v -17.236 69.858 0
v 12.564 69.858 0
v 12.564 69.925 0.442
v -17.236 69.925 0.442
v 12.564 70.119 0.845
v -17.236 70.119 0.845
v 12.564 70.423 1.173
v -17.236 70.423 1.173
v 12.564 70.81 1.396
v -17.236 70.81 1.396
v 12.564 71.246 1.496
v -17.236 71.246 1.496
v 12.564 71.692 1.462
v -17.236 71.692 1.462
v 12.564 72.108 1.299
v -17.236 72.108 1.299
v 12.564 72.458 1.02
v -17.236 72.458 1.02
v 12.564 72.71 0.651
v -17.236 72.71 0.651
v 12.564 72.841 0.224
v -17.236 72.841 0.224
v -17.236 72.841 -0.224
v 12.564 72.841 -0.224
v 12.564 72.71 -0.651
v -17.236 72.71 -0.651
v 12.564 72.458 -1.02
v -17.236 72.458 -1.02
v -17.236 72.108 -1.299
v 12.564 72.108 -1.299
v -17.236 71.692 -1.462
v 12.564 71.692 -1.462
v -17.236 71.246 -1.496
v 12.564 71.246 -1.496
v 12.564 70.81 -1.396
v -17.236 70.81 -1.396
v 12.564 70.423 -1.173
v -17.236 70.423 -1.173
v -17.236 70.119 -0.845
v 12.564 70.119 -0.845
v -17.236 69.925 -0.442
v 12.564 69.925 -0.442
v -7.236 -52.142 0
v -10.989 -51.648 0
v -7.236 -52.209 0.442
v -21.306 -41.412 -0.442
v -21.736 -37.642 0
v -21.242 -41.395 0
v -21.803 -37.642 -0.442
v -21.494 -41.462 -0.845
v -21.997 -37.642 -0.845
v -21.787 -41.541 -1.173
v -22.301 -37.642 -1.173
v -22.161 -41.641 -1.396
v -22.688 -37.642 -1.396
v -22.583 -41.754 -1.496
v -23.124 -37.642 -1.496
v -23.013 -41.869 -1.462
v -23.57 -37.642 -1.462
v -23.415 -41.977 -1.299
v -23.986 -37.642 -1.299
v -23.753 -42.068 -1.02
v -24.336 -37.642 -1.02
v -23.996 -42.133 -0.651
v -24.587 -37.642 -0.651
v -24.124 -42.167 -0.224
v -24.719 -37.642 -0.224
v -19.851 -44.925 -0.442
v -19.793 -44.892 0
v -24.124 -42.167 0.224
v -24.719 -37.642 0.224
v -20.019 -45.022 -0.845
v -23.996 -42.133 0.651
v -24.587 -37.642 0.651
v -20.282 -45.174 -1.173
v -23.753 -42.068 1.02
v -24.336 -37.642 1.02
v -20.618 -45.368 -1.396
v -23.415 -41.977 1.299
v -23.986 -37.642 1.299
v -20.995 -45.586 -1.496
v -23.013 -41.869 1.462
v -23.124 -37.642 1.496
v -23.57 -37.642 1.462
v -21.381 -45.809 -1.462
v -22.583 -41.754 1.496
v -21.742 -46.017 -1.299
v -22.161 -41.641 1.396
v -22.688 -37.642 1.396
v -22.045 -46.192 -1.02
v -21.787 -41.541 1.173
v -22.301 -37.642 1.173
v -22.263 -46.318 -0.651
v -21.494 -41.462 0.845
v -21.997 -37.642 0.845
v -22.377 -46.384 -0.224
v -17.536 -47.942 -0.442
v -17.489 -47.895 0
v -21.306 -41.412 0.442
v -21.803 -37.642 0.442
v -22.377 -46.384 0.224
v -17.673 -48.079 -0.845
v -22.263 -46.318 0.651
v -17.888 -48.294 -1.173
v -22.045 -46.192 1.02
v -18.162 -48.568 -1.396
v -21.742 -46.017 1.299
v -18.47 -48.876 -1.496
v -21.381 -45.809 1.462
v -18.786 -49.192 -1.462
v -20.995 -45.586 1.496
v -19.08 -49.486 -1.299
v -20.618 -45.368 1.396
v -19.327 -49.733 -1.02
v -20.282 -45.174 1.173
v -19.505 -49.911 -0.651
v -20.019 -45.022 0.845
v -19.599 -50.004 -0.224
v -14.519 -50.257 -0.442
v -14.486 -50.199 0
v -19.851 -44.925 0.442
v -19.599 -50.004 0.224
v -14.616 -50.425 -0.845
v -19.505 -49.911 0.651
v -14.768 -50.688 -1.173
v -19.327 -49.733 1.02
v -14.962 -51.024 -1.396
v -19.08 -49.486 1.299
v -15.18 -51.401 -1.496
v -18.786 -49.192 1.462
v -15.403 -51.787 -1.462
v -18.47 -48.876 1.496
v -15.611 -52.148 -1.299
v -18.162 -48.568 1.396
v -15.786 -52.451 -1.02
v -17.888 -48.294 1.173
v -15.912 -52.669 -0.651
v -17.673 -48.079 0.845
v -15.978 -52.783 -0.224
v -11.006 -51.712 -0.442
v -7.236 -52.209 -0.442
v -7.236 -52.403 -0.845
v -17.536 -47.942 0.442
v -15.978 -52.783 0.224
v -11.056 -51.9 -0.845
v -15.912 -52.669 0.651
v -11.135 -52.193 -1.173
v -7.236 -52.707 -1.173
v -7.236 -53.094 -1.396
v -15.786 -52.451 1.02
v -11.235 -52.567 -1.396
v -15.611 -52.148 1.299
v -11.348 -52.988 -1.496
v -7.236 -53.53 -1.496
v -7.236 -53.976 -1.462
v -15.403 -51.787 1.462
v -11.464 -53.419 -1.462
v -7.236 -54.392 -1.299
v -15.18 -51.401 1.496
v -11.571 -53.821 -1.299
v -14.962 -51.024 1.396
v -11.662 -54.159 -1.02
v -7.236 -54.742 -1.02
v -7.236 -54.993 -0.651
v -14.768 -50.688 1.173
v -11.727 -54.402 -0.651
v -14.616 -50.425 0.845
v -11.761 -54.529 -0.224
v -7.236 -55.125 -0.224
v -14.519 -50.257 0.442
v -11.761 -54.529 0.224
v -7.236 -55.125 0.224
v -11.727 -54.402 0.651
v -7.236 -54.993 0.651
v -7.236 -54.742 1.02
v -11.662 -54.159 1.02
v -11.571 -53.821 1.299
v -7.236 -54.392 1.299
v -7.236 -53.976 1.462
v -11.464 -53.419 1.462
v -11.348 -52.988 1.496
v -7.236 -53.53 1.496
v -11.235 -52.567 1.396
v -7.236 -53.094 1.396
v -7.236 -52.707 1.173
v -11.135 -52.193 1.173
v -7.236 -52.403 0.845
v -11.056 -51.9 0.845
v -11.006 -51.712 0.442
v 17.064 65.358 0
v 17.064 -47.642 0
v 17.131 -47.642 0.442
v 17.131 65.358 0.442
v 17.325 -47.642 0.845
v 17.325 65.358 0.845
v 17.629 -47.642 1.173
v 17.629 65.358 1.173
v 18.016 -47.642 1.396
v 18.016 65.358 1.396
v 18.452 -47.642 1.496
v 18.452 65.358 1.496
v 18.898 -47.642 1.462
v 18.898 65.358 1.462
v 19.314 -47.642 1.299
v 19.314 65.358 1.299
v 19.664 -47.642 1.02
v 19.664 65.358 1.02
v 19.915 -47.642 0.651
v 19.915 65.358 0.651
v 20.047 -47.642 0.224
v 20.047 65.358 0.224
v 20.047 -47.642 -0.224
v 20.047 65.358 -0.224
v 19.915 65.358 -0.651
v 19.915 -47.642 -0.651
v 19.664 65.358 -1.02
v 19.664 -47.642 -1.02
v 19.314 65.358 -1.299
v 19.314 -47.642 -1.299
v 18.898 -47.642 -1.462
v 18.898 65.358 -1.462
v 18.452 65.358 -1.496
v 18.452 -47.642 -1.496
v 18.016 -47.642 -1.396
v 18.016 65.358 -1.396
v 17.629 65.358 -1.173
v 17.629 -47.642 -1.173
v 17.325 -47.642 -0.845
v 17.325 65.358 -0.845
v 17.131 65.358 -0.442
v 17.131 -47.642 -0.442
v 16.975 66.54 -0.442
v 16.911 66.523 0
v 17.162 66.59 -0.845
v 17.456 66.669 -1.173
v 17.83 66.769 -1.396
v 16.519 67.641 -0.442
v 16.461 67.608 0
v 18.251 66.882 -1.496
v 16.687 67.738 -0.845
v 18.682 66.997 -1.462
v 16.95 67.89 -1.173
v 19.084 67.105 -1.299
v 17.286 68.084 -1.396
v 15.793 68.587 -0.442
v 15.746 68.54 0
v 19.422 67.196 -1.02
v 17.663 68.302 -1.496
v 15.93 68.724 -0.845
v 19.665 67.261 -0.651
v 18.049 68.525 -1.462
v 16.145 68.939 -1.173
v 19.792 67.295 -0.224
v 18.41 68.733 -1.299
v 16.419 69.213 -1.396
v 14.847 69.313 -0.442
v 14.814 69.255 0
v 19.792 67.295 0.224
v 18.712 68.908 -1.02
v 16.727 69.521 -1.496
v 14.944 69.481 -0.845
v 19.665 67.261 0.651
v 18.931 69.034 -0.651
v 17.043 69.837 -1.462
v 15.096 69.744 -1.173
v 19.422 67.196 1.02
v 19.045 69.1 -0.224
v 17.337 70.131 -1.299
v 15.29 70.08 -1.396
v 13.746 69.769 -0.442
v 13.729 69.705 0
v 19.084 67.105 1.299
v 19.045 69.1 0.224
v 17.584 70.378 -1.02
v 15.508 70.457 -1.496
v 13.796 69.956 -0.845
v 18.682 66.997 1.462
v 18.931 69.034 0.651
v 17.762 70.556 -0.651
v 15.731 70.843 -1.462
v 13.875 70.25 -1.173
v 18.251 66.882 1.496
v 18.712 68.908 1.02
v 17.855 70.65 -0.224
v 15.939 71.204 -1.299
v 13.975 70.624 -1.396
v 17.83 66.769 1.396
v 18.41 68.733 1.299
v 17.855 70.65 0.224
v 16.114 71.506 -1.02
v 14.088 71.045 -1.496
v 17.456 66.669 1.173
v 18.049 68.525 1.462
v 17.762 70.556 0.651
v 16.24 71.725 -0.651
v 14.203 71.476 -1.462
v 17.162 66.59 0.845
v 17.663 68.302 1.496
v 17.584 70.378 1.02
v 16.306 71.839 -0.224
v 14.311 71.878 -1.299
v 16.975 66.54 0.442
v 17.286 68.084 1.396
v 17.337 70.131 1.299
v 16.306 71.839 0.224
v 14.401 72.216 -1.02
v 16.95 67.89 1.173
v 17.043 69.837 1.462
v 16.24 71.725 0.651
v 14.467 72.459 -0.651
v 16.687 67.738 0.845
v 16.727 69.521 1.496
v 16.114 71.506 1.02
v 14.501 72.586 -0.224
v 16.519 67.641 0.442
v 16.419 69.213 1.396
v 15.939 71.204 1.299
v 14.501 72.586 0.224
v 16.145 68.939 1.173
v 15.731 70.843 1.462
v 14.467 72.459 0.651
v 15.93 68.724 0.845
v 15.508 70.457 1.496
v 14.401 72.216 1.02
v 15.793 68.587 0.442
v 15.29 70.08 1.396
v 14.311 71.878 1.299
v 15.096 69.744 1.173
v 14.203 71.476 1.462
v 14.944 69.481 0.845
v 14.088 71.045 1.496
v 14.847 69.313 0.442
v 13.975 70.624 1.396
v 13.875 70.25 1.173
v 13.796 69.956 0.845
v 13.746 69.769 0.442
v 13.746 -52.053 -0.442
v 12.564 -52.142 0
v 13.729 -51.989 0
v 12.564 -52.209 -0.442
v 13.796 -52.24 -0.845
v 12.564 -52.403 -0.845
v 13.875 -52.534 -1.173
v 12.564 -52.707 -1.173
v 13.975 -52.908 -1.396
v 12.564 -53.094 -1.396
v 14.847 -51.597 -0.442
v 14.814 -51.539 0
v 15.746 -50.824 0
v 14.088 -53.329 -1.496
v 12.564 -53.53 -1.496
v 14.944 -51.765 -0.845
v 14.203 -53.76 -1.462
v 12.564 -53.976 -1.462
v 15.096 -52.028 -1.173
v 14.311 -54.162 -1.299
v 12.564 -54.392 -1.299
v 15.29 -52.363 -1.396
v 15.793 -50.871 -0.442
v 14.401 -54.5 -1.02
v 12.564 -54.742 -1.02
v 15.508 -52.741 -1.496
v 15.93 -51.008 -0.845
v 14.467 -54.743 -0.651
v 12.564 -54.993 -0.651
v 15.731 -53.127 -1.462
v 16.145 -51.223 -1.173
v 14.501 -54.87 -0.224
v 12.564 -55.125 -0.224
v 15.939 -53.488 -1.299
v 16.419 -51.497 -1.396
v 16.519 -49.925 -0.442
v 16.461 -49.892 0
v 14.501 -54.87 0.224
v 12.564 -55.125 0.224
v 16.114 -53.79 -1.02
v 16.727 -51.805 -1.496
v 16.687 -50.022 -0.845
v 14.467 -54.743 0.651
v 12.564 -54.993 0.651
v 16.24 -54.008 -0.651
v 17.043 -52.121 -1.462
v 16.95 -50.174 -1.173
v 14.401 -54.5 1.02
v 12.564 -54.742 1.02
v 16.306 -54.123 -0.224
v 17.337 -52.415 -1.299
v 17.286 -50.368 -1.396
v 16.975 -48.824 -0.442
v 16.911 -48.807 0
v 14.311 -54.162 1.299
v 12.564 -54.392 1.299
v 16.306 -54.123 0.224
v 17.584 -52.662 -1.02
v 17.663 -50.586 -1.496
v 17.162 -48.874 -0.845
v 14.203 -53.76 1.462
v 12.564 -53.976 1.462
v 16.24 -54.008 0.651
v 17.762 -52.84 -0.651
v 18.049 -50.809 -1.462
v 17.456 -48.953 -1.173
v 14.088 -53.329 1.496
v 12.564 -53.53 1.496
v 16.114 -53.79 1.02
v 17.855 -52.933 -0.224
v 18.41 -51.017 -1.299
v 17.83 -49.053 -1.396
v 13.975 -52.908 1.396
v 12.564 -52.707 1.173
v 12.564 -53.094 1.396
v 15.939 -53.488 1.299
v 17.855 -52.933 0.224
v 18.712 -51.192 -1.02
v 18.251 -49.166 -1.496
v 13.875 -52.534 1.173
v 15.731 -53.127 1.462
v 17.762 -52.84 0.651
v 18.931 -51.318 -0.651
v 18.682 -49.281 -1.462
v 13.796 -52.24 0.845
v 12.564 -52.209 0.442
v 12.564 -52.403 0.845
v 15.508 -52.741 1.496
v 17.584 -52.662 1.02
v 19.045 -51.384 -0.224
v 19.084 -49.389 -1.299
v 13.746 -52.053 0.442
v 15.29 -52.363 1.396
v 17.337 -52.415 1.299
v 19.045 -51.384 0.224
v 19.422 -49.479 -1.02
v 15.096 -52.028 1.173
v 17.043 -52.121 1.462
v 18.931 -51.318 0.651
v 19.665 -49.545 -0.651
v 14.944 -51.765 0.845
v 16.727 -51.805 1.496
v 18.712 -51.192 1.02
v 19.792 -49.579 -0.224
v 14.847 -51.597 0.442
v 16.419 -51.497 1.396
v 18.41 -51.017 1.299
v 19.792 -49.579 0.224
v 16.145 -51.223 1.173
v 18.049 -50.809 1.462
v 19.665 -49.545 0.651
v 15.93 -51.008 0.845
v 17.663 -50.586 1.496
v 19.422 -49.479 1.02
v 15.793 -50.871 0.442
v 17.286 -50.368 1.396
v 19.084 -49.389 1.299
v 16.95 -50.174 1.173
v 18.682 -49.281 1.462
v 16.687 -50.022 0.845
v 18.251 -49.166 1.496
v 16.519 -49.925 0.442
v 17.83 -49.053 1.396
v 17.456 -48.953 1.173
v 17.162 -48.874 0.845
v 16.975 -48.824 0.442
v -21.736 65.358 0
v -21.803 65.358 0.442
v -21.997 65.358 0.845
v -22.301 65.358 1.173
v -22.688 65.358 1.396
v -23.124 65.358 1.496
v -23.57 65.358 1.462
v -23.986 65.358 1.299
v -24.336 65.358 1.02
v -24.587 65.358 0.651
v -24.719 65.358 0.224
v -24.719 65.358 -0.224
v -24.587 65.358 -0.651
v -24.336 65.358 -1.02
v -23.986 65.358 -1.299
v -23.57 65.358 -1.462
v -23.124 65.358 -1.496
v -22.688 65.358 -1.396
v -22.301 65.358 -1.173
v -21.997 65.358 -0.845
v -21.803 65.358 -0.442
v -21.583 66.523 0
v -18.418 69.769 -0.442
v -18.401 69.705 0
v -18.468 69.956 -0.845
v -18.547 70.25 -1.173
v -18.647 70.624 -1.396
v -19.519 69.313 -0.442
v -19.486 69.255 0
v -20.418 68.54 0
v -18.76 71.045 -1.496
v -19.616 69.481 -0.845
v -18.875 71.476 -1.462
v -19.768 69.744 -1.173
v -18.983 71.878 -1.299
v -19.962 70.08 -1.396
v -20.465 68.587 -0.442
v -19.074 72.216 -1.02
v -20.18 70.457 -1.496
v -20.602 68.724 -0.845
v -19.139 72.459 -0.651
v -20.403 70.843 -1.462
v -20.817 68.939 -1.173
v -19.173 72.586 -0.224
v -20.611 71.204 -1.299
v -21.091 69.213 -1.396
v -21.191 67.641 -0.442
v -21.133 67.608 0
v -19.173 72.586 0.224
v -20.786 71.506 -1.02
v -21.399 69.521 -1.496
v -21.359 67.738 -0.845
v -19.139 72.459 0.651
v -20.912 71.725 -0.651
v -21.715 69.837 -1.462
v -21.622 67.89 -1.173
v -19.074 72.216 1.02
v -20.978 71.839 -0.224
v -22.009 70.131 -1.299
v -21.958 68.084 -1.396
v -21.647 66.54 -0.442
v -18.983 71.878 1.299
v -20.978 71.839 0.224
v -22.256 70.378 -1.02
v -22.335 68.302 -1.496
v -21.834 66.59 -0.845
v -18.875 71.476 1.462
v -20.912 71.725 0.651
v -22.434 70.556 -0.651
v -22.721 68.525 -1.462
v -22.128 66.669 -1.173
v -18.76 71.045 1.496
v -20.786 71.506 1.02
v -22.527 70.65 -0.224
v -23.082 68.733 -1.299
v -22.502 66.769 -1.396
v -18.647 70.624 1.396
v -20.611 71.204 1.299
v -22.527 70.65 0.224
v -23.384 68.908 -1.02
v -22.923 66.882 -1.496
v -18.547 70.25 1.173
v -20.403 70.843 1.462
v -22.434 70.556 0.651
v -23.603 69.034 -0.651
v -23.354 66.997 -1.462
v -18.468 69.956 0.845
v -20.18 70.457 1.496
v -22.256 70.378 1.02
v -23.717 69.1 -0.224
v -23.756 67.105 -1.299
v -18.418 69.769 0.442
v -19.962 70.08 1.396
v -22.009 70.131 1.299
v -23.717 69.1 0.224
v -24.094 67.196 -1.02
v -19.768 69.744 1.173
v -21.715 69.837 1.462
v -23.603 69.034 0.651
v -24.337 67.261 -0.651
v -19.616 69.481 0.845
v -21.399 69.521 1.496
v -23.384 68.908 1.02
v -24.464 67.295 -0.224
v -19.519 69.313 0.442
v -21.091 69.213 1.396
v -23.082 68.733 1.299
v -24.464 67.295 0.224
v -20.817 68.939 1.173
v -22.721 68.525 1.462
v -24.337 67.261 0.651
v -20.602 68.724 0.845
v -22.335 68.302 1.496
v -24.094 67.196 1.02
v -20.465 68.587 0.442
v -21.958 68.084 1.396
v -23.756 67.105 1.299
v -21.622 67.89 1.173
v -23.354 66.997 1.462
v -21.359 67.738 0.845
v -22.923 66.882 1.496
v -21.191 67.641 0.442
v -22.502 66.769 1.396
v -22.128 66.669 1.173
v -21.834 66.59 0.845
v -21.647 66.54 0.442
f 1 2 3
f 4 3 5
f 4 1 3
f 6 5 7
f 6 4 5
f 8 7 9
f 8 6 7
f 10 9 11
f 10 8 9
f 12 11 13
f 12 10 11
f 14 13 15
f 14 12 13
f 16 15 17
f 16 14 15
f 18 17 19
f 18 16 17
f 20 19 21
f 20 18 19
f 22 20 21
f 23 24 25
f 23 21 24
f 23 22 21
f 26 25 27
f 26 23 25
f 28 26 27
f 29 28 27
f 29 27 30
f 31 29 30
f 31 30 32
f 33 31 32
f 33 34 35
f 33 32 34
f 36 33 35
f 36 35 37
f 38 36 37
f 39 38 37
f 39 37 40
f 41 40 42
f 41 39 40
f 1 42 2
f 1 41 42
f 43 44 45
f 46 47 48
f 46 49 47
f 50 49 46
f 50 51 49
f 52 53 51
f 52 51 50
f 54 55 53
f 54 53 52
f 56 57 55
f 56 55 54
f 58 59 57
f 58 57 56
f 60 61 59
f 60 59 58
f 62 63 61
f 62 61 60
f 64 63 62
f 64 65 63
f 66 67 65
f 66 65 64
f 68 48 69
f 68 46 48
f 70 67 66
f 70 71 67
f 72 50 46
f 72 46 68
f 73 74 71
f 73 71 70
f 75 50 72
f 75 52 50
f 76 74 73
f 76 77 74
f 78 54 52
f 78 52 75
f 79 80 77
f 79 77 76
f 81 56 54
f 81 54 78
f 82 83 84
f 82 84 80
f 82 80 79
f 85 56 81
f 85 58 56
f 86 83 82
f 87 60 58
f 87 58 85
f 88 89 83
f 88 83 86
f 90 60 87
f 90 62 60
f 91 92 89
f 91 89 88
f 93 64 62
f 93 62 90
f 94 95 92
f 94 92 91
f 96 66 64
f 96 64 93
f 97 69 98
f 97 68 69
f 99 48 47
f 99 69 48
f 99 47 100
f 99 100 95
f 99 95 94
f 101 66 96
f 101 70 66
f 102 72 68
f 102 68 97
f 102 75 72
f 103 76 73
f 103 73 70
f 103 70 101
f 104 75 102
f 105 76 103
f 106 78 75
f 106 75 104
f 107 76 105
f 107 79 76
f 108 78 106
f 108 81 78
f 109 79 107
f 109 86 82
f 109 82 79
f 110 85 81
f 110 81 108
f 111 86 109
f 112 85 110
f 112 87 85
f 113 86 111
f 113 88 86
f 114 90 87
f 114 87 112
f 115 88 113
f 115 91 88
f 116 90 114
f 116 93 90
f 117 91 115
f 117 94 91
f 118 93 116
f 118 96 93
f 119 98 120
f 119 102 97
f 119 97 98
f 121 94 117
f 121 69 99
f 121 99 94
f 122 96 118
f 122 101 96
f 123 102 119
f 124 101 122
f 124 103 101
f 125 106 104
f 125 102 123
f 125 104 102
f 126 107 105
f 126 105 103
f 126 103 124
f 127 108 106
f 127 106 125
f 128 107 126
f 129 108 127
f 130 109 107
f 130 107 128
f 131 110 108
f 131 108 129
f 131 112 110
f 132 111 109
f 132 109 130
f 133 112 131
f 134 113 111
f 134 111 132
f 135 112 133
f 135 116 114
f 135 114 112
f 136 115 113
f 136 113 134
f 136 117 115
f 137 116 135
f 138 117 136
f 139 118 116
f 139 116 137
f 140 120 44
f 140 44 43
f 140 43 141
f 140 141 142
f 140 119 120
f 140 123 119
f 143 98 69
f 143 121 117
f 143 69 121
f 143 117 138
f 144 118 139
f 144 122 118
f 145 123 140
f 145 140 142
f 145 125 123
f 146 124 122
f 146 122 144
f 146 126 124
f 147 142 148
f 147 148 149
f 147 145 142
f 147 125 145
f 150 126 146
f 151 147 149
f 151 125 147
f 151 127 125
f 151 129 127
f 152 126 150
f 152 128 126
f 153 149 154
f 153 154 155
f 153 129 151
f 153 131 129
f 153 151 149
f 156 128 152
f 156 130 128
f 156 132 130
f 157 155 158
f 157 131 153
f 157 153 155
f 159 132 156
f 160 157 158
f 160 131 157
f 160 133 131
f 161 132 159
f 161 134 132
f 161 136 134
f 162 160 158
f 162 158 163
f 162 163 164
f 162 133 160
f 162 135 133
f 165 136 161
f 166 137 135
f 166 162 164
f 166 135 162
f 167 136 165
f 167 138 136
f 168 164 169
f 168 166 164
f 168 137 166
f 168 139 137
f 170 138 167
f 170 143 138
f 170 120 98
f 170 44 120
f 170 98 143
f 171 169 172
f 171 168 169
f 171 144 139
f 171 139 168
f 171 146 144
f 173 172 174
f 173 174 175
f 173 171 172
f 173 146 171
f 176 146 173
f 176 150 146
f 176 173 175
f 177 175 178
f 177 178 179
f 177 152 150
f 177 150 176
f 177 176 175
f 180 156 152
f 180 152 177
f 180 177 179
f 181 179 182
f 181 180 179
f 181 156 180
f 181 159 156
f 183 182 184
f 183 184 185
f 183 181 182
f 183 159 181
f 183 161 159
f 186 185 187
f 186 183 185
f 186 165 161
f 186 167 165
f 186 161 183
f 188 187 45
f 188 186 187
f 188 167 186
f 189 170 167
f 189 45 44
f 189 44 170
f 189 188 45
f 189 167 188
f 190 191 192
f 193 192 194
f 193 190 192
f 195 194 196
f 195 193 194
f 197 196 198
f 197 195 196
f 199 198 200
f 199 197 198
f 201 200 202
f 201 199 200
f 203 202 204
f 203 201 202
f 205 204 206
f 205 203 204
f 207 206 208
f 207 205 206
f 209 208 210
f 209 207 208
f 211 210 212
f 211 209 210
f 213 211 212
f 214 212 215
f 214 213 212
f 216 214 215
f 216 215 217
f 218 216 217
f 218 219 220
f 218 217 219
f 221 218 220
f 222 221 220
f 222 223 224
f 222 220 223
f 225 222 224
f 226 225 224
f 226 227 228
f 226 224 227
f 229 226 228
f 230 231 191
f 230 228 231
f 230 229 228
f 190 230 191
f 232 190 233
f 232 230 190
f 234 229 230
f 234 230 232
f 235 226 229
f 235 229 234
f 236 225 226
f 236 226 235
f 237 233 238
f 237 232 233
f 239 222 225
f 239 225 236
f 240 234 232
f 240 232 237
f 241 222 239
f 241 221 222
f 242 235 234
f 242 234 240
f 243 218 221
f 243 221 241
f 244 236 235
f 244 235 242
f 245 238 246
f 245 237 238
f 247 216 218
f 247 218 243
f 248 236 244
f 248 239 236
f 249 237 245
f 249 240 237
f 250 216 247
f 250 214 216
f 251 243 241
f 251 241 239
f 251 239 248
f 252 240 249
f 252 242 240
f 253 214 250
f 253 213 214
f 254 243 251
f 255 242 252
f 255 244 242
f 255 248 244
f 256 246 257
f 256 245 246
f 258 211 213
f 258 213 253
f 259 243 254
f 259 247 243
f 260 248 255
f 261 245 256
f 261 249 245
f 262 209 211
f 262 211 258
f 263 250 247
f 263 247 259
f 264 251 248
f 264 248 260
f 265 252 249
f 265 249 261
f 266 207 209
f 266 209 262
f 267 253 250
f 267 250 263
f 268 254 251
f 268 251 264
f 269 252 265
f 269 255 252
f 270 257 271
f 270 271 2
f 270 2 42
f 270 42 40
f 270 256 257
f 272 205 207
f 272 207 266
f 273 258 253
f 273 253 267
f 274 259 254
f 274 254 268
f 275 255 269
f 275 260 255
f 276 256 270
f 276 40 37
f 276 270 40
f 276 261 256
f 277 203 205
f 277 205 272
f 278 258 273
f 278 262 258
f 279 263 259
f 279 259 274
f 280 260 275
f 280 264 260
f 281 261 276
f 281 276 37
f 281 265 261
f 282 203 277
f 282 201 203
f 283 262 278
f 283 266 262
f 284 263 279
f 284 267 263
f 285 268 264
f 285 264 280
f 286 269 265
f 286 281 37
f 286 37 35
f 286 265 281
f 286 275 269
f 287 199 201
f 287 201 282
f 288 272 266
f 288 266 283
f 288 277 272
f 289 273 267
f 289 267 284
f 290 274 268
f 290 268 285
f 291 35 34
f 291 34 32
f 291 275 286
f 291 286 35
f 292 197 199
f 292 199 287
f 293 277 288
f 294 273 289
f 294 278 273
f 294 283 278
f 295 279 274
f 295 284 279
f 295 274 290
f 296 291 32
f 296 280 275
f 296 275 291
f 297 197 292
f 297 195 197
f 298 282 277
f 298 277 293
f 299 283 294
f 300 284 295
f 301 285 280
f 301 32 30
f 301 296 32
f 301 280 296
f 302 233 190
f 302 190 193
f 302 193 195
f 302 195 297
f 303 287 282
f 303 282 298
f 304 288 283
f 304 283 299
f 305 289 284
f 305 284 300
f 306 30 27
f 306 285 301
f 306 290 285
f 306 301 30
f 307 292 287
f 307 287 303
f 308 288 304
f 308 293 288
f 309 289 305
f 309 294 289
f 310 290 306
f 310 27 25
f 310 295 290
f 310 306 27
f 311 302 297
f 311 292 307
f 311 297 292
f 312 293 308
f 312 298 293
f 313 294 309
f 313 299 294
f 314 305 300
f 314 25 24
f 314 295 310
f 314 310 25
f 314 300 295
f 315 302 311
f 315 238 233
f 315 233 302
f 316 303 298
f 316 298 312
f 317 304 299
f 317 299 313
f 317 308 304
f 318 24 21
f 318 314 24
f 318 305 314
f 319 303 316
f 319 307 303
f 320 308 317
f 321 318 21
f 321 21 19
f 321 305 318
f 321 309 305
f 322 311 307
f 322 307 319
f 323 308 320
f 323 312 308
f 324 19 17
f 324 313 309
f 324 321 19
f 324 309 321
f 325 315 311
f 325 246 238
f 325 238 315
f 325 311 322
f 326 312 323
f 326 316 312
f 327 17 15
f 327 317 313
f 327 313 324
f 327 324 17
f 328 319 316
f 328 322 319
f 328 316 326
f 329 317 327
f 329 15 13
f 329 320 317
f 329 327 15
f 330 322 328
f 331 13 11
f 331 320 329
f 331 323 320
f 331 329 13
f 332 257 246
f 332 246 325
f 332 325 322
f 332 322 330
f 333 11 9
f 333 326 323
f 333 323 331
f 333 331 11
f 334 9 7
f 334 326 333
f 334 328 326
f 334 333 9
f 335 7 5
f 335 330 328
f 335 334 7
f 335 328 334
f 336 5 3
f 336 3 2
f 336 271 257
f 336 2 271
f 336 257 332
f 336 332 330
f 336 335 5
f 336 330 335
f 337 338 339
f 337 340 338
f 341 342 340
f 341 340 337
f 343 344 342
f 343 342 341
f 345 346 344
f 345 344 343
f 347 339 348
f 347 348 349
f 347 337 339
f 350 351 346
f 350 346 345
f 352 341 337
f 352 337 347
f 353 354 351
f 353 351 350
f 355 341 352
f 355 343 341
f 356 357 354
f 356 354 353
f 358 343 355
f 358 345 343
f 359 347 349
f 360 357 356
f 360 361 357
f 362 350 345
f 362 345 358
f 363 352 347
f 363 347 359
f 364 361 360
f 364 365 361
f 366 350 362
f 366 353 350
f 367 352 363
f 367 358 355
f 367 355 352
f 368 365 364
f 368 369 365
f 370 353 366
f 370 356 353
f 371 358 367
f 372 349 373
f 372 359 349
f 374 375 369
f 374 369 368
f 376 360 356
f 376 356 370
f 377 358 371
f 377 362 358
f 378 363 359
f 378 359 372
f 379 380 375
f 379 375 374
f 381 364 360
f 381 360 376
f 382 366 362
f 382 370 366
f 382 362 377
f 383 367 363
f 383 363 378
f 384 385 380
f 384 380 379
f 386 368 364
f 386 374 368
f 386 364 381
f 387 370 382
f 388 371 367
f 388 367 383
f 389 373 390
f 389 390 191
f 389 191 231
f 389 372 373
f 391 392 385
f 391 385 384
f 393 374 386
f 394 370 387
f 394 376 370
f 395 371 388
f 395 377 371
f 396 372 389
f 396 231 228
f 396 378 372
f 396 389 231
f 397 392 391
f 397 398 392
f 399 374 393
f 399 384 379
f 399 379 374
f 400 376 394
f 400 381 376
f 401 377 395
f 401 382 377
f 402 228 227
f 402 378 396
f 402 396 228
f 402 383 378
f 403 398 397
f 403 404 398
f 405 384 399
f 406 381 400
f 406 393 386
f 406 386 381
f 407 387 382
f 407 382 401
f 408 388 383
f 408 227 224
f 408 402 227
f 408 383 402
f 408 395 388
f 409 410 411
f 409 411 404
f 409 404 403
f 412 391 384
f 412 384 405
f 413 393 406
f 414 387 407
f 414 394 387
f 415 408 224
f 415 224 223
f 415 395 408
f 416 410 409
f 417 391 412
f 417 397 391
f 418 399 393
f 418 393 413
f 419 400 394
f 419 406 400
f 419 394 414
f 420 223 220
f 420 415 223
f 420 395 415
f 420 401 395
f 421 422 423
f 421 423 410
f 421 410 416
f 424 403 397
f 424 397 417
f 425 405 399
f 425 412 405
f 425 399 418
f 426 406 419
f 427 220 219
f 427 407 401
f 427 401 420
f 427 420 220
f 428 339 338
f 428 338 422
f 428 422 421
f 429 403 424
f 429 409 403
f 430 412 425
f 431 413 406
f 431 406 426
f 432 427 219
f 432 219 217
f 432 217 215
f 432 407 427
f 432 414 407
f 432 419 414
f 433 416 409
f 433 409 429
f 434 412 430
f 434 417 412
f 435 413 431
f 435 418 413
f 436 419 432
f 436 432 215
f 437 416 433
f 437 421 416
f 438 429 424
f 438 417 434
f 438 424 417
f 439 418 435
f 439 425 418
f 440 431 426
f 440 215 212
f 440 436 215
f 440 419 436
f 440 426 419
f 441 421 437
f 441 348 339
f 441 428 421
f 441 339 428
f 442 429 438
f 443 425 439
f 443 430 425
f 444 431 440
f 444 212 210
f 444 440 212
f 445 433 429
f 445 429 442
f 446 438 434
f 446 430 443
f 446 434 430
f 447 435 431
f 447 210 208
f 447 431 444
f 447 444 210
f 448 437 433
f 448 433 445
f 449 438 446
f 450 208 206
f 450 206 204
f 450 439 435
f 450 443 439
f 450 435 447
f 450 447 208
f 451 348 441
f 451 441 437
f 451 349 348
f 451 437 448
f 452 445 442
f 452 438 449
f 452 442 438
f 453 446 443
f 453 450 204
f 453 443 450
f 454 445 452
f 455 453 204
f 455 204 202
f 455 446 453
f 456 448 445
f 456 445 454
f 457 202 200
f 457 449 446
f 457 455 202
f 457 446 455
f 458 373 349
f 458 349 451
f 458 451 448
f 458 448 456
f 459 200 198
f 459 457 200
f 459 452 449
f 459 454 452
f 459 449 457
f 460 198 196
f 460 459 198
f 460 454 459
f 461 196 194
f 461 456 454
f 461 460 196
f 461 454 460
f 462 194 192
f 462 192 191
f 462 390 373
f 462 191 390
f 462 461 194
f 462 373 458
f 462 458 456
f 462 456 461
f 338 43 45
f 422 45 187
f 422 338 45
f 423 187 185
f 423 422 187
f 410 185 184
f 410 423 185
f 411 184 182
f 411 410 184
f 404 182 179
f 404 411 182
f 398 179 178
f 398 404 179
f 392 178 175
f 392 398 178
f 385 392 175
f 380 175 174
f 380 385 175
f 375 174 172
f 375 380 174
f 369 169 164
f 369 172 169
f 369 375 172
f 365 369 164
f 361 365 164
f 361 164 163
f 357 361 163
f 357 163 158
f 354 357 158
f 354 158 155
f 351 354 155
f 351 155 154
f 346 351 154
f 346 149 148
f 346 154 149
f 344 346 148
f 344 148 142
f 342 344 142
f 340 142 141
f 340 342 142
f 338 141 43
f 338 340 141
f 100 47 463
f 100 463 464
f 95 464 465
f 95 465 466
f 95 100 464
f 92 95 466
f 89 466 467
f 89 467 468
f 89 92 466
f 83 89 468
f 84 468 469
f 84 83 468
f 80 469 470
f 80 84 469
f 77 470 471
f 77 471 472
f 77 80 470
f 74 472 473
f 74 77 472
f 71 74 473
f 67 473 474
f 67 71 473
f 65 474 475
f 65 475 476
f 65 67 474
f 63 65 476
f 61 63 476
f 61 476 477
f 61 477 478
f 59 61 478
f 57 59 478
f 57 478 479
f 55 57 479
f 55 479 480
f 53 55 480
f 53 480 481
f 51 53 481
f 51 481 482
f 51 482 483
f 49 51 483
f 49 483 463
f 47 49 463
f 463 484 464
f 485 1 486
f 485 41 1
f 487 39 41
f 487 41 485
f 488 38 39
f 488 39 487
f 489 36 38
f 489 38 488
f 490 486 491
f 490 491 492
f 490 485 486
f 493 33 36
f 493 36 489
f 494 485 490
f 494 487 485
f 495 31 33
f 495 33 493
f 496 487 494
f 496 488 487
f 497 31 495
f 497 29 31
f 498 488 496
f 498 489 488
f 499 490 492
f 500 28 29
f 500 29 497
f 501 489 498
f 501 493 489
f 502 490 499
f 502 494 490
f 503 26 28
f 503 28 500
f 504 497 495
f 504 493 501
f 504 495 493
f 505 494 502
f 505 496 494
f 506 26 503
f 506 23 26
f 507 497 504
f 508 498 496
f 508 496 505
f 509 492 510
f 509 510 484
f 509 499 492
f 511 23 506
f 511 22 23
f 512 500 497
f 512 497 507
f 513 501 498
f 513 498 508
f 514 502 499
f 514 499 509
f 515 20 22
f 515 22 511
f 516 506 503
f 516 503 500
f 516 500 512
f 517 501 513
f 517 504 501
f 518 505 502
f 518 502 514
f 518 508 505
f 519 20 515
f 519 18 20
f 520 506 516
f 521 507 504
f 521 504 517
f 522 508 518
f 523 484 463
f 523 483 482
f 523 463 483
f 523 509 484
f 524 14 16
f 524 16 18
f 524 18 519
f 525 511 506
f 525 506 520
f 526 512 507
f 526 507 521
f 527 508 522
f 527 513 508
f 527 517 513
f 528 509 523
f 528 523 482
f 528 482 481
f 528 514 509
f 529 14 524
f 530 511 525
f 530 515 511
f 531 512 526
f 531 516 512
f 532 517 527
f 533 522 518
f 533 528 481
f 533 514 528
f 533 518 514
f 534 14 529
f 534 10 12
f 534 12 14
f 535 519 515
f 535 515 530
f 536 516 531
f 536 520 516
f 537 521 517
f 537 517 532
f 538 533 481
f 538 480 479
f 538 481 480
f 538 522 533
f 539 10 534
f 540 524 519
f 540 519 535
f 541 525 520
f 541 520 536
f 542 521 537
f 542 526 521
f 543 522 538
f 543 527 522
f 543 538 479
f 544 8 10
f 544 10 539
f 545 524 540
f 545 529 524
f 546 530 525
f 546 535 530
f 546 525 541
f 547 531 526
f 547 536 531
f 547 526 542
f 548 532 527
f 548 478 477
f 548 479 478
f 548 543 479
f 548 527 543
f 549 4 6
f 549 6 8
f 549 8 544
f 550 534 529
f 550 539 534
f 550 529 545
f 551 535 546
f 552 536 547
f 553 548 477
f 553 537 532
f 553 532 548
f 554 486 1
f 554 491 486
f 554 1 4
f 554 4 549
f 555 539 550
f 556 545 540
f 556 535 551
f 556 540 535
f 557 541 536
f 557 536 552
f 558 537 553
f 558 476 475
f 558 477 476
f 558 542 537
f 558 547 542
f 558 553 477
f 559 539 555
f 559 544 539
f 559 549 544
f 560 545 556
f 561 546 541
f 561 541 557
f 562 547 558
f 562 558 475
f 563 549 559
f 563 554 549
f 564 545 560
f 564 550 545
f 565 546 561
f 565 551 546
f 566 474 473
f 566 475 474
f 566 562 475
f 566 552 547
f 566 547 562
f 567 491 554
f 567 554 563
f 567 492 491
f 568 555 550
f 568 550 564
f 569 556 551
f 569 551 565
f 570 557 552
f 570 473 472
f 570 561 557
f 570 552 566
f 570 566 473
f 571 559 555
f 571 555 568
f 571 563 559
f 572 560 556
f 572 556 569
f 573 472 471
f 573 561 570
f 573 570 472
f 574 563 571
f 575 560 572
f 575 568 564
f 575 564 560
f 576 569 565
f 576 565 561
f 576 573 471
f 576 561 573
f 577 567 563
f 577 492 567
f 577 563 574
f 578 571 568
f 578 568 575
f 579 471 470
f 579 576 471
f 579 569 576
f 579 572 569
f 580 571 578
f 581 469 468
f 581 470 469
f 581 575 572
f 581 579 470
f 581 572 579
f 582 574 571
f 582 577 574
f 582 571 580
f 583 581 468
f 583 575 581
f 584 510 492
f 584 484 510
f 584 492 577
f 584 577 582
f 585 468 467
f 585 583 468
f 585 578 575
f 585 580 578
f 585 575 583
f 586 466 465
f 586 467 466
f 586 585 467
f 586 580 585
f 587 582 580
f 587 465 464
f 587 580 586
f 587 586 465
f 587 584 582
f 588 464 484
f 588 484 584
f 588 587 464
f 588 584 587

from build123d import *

# Parameters (mm, degrees)
SKETCH5_R = 1.5


with BuildPart() as part:
    # Sweep2: sweep along a path in Sketch4
    with BuildLine(Plane.XY) as sweep2_path:
        Line((-23.236021708, 65.358068893), (-23.236021708, -37.641931107))
        ThreePointArc((-23.236021708, -37.641931107), (-18.549730207, -48.955639606), (-7.236021708, -53.641931107))
        Line((-7.236021708, -53.641931107), (12.563978292, -53.641931107))
        ThreePointArc((12.563978292, -53.641931107), (16.806618979, -51.884571794), (18.563978292, -47.641931107))
        Line((18.563978292, -47.641931107), (18.563978292, 65.358068893))
        ThreePointArc((18.563978292, 65.358068893), (16.806618979, 69.60070958), (12.563978292, 71.358068893))
        Line((12.563978292, 71.358068893), (-17.236021708, 71.358068893))
        ThreePointArc((-17.236021708, 71.358068893), (-21.478662395, 69.60070958), (-23.236021708, 65.358068893))
    # Sketch5 → Sweep2 (sweep)
    with BuildSketch(Plane(origin=(0, 0, 0), x_dir=(1, 0, 0), z_dir=(0, 1, 0))):
        with Locations((-23.236021708, 0)):
            Circle(SKETCH5_R)
    sweep(path=sweep2_path.line)


solid = part.part
